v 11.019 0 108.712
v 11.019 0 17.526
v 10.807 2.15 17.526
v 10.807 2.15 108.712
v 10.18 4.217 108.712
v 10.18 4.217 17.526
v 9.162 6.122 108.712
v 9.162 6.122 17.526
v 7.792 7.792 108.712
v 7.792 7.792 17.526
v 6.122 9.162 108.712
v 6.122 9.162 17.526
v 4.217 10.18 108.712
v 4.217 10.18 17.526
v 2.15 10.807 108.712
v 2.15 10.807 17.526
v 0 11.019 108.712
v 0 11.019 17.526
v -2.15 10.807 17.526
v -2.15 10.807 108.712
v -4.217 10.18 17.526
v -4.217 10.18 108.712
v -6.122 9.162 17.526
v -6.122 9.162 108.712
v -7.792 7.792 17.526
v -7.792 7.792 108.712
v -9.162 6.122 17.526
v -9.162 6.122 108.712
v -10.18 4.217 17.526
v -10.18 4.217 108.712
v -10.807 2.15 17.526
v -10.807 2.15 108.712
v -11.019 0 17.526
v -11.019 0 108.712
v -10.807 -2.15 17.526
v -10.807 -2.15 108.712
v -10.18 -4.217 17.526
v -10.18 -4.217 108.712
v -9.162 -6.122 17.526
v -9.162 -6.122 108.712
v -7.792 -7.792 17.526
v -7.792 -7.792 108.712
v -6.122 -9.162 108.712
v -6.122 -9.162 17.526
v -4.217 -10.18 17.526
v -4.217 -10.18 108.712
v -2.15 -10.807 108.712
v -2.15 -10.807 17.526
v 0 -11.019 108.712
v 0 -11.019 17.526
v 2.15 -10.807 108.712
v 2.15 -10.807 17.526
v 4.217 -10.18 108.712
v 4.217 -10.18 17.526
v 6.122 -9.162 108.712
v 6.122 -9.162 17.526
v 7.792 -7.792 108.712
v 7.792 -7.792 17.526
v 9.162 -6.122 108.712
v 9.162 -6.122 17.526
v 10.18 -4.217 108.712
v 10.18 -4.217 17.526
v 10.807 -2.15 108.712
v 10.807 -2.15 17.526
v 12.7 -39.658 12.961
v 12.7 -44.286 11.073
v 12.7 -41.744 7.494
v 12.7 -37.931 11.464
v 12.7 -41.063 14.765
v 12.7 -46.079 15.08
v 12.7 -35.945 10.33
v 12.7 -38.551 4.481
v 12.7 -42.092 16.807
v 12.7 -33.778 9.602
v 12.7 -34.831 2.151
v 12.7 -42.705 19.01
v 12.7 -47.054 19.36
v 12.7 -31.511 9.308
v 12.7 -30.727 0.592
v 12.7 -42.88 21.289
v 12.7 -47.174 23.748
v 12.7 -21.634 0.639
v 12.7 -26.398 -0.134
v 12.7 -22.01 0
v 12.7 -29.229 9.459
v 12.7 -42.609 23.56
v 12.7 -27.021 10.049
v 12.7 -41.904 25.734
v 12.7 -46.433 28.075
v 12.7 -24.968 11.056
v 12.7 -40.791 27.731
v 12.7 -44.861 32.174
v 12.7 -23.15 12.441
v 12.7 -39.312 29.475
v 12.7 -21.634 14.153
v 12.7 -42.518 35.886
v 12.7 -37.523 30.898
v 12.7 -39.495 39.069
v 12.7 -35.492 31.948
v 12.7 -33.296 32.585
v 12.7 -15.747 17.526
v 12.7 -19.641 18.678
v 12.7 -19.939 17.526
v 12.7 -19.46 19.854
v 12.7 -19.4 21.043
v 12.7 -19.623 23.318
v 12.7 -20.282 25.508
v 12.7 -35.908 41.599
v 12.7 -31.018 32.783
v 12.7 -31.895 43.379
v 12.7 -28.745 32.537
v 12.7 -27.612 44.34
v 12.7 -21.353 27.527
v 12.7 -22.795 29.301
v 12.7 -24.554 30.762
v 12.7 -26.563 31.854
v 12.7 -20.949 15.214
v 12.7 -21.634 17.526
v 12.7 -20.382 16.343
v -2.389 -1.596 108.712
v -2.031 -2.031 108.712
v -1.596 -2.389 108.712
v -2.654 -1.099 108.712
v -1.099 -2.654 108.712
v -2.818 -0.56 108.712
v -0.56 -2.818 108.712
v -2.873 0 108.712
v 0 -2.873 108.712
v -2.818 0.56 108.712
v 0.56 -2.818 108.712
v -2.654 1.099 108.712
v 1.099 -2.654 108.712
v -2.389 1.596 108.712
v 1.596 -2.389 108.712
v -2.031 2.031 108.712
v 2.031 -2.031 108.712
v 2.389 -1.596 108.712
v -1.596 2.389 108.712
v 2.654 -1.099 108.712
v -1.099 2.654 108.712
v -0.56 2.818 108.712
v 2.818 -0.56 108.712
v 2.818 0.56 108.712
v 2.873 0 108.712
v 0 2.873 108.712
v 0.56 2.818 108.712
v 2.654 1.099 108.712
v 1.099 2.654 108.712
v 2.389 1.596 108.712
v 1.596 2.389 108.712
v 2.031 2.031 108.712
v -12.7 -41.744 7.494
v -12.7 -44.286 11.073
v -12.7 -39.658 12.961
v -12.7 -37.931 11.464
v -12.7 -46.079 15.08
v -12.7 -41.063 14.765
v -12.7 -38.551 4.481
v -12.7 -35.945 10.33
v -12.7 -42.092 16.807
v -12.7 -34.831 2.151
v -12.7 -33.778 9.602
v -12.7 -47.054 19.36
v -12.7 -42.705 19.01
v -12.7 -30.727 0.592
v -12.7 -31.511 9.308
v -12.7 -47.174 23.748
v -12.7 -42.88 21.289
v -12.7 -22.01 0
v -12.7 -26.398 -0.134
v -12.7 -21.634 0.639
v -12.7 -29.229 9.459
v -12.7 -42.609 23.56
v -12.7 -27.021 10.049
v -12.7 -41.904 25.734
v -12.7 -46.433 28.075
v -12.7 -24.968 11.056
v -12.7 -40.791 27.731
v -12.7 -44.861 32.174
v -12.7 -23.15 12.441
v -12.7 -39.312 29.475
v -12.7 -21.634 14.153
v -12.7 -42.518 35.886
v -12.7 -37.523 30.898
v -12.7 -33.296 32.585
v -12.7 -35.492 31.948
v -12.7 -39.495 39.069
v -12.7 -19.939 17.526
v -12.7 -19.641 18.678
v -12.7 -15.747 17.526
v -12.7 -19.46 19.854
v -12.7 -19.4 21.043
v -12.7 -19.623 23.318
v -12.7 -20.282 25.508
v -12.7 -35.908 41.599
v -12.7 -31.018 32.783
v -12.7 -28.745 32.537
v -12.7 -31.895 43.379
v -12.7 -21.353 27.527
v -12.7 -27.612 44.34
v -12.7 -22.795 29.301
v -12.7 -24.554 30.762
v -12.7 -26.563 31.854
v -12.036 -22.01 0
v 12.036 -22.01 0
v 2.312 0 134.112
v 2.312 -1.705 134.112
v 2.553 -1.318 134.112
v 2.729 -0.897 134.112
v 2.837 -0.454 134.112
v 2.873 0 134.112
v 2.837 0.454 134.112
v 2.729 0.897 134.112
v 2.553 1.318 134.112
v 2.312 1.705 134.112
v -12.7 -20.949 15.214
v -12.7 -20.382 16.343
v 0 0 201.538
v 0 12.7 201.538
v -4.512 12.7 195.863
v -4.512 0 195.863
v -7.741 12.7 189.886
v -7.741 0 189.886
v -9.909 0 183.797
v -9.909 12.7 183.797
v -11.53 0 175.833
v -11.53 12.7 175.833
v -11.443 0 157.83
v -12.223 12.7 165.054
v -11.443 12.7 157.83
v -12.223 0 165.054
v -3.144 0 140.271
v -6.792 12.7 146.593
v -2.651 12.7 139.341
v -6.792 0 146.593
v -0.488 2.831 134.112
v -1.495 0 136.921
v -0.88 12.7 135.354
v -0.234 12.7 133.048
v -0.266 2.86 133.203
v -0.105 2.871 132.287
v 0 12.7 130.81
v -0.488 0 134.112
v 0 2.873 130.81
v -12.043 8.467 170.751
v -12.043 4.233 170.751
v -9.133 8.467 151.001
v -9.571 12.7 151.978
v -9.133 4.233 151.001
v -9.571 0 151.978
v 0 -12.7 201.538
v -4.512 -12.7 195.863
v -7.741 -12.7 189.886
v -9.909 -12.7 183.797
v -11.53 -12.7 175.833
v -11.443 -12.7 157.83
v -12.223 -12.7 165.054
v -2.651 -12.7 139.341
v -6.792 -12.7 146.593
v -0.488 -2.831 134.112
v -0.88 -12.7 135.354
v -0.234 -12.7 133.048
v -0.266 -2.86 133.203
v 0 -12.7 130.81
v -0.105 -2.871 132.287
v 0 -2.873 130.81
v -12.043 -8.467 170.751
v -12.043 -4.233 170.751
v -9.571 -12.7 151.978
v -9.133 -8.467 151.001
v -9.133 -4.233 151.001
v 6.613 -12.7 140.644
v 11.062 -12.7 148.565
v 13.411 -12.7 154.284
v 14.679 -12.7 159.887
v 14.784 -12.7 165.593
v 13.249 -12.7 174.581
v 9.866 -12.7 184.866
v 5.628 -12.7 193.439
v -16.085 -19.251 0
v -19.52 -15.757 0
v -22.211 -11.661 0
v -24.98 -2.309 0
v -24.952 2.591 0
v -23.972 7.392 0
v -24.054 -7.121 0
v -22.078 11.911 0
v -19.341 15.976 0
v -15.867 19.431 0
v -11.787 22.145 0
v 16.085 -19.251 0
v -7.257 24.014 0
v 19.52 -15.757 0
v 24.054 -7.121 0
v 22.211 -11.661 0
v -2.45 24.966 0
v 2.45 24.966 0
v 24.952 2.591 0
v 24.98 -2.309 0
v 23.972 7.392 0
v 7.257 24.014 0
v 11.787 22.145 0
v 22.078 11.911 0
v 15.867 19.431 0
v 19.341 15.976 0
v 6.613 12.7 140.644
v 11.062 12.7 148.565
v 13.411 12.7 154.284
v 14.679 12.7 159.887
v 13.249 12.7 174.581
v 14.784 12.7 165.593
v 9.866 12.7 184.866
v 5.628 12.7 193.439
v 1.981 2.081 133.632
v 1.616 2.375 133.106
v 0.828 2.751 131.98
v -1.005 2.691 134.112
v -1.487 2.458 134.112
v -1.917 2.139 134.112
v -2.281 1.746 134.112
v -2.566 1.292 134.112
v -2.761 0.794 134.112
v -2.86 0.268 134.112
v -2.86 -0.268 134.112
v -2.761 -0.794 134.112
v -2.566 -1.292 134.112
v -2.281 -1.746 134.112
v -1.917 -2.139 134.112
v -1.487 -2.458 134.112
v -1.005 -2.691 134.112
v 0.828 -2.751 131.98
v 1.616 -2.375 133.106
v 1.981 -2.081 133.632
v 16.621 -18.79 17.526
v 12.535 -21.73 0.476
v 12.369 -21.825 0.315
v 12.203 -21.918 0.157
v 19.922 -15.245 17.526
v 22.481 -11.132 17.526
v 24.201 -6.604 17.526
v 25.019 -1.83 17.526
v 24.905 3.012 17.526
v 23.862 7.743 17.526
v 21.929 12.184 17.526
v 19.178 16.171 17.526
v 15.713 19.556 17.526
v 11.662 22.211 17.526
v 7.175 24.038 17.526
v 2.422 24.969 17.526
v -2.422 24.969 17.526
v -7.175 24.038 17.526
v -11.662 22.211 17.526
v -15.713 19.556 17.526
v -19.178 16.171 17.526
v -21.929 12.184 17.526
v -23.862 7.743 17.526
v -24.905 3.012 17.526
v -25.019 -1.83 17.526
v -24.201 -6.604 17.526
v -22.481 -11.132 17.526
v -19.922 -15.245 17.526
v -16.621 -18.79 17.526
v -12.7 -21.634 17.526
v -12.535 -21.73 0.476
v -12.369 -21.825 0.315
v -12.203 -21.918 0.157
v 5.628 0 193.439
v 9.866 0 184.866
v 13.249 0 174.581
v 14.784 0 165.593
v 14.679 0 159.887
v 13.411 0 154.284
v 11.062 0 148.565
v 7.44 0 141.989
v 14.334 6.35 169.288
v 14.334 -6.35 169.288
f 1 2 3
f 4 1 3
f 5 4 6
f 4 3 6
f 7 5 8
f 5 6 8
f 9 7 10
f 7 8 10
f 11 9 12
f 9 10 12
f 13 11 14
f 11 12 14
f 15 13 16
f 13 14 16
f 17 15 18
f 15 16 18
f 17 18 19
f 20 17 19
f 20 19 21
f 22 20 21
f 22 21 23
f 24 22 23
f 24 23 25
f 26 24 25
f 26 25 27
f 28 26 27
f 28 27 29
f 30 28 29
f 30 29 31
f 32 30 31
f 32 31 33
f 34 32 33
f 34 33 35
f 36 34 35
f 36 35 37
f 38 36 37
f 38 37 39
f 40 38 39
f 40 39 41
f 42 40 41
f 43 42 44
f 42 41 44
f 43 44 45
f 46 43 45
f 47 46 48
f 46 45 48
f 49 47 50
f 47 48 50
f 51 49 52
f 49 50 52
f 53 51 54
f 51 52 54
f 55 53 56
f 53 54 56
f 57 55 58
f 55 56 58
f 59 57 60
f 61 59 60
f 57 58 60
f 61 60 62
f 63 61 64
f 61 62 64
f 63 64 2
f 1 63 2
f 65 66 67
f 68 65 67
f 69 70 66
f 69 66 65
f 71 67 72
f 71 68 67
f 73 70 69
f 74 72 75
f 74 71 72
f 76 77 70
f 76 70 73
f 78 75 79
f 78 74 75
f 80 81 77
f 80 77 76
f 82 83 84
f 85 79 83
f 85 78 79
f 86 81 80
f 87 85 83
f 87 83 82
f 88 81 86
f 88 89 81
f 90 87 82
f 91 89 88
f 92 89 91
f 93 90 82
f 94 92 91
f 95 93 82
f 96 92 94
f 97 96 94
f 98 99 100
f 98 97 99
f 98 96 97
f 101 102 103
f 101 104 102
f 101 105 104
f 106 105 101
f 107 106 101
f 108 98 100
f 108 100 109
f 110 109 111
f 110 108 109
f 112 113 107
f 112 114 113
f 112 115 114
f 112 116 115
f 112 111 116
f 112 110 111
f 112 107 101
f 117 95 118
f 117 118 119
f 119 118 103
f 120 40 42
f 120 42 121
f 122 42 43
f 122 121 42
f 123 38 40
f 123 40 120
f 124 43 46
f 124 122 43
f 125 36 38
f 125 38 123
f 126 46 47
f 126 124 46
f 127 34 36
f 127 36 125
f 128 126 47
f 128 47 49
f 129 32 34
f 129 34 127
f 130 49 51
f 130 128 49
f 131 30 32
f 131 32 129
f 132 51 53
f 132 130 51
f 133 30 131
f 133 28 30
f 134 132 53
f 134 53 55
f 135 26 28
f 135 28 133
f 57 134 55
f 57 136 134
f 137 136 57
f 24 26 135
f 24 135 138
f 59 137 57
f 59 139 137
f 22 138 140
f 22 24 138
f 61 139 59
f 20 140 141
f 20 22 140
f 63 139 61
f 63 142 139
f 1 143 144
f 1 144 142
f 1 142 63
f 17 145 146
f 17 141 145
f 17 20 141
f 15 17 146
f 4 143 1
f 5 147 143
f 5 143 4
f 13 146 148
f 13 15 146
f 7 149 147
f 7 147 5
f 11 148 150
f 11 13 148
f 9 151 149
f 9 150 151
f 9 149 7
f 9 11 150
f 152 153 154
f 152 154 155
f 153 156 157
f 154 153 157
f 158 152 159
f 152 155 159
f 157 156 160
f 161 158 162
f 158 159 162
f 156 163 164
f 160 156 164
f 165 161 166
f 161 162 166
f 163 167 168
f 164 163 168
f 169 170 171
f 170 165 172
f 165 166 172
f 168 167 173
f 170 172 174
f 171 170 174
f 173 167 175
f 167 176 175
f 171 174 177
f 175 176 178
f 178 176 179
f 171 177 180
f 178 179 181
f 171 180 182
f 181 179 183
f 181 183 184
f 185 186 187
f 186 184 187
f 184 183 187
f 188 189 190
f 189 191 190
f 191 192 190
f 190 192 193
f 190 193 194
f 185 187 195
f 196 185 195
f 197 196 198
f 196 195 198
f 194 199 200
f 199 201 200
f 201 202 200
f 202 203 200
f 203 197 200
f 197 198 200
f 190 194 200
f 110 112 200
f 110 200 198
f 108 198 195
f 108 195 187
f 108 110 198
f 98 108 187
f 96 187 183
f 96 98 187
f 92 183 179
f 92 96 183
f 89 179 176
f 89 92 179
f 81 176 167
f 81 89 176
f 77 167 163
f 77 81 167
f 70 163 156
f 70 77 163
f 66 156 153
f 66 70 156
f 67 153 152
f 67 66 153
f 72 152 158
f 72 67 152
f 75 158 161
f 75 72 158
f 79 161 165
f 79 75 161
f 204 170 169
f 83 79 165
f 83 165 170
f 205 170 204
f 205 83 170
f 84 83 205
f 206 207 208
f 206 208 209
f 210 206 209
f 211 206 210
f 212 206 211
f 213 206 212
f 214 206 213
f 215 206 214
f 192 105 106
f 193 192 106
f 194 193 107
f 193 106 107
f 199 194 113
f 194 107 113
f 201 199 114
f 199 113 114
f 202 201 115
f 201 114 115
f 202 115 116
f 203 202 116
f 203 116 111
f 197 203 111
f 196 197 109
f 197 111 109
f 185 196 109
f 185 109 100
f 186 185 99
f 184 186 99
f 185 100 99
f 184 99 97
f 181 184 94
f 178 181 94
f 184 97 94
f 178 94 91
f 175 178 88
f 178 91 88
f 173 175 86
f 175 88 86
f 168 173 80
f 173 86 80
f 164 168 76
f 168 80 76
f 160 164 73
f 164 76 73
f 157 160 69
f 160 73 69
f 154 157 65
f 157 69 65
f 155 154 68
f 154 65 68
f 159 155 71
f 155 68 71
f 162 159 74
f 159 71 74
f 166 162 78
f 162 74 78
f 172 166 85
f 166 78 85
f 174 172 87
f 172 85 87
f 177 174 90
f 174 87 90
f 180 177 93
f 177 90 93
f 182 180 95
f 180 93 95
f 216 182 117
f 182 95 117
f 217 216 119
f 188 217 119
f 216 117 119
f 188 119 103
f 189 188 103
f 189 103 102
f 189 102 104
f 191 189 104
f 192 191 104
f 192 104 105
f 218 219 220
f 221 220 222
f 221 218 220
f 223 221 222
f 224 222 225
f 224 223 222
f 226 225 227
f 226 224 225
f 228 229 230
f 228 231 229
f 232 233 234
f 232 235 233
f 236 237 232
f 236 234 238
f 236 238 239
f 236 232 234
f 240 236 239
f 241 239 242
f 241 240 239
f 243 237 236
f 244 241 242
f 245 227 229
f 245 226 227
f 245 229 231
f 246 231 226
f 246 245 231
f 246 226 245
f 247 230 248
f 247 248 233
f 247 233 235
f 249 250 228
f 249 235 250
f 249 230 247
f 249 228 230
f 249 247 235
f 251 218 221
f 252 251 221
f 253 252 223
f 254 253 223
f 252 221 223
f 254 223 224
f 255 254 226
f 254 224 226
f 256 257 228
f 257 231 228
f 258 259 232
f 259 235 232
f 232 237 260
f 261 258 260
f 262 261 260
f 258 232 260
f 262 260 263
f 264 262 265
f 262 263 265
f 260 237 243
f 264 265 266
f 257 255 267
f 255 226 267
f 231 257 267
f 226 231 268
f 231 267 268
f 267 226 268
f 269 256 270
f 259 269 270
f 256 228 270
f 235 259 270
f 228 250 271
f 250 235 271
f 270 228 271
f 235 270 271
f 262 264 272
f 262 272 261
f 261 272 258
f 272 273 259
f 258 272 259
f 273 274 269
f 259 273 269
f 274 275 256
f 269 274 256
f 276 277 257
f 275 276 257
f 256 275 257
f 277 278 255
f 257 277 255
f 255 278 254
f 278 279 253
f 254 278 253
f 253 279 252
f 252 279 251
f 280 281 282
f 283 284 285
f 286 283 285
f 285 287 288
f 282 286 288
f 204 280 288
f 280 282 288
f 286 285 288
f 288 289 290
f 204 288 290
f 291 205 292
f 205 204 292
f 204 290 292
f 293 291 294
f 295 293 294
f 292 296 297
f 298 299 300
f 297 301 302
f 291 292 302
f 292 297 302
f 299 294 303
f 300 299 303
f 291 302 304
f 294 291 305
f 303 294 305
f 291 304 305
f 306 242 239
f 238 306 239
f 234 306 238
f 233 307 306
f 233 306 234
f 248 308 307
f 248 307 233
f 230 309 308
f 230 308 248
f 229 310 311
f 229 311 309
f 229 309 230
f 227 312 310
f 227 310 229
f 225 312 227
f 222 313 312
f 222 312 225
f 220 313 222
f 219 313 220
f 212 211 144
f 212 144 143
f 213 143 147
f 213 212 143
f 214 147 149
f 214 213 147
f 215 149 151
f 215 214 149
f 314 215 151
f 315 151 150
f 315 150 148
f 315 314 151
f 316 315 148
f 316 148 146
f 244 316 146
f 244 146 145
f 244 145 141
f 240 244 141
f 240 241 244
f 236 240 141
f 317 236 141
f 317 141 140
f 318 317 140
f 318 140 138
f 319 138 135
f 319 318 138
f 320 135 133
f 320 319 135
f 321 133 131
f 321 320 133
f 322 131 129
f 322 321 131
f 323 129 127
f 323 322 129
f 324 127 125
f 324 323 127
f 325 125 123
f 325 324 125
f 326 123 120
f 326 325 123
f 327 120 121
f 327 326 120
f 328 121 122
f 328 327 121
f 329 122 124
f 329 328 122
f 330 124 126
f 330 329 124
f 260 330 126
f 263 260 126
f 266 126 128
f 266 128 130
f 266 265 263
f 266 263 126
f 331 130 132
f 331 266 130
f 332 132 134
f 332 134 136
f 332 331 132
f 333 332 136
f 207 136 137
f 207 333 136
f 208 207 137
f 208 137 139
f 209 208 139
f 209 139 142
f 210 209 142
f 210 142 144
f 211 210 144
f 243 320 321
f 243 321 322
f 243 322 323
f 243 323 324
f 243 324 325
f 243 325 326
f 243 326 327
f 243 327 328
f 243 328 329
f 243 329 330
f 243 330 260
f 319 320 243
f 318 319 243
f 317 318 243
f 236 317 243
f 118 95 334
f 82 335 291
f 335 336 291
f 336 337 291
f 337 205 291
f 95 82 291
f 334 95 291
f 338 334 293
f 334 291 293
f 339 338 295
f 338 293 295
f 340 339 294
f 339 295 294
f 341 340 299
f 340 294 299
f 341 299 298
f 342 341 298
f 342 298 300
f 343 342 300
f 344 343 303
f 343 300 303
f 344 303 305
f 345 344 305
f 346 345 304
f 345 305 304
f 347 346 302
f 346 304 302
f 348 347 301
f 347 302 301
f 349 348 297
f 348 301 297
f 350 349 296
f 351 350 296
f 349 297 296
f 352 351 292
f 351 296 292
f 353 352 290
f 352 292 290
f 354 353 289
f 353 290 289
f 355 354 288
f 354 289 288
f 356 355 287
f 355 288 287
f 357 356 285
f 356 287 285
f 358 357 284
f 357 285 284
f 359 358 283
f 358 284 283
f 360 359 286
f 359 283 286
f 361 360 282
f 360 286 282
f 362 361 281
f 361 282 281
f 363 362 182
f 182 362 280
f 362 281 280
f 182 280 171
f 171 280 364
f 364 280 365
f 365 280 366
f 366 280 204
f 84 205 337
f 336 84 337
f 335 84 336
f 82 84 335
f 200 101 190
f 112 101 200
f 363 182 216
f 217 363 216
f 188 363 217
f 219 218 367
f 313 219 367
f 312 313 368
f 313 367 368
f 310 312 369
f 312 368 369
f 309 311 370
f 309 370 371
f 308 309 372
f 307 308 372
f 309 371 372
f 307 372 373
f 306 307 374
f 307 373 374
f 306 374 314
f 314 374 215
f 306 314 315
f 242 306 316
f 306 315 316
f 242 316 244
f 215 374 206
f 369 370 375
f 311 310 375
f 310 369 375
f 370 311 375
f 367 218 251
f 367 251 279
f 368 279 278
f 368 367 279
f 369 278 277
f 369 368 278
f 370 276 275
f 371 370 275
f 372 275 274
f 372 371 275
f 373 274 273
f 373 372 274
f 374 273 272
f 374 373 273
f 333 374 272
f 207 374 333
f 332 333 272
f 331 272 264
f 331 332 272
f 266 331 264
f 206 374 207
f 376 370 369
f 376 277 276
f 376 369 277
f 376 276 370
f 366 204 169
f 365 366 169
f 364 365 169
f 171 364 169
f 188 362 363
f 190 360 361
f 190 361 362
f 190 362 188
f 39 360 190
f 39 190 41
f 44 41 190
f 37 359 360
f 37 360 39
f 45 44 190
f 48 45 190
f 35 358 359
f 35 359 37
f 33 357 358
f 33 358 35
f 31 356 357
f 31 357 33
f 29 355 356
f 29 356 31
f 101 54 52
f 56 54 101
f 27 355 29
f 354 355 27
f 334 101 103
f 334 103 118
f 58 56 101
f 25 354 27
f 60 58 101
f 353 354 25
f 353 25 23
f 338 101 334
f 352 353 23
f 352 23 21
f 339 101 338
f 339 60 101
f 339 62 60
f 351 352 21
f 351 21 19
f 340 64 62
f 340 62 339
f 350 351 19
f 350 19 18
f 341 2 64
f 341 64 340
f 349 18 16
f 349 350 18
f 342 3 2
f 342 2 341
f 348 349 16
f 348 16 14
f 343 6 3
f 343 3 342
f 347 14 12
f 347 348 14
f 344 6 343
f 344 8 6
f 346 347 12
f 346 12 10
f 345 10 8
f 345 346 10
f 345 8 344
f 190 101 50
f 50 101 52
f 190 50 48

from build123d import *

# Parameters (mm, degrees)
F0_R      = 25.0862676095
F0_R_2    = 9.9212052261
F1_DEPTH  = 17.526
F2_R      = 11.0191356669
F3_DEPTH  = 108.712
F5_R      = 2.8727507543
F6_DEPTH  = 25.4
F8_DEPTH  = 12.7
F9_R      = 11.7410453839
F10_DEPTH = 12.7
F12_DEPTH = 12.7


with BuildPart() as f1:
    # F0 (on Top) → F1 (new body)
    with BuildSketch(Plane.XY):
        Circle(F0_R)
        Circle(F0_R_2, mode=Mode.SUBTRACT)
    extrude(amount=F1_DEPTH)

    # F2 (on Top) → F3 (join)
    with BuildSketch(Plane.XY):
        Circle(F2_R)
    extrude(amount=F3_DEPTH)

    # F5 (on offset) → F6 (join)
    with BuildSketch(Plane.XY.offset(134.112)):
        Circle(F5_R)
    extrude(amount=-F6_DEPTH)

    # F7 (on Right) → F8 (join, symmetric)
    with BuildSketch(Plane.YZ):
        with BuildLine():
            Line((-14.0056908131, 13.5905332863), (-27.6115936243, 44.3398724095))
            ThreePointArc((-27.6115936243, 44.3398724095), (-47.0539529538, 19.3601672357), (-22.0104921012, 0))
            Line((-22.0104921012, 0), (-14.0056908131, 13.5905332863))
        make_face()
    extrude(amount=F8_DEPTH, both=True)

    # F9 (on Right) → F10 (cut, symmetric)
    with BuildSketch(Plane.YZ):
        with Locations((-31.1411302537, 21.0428796709)):
            Circle(F9_R)
    extrude(amount=F10_DEPTH, both=True, mode=Mode.SUBTRACT)

    # F11 (on Front) → F12 (join, symmetric)
    with BuildSketch(Plane.XZ):
        with BuildLine():
            add(Edge.make_bspline(
                [(0, 201.5375494957), (8.2067918749, 191.5956386678), (17.6385011209, 165.7506647475), (14.33397457, 150.9642153978), (0, 130.8100919055)],
                knots=[0, 0, 0, 0, 0.4810826992, 1, 1, 1, 1], degree=3))
            add(Edge.make_bspline(
                [(0, 201.5375494957), (-9.1203246266, 192.0092403889), (-13.1277565836, 171.0788275856), (-11.6600287617, 151.1036541195), (0, 137.038230896), (0, 130.8100919055)],
                knots=[0, 0, 0, 0, 0.3852312794, 0.6845969407, 1, 1, 1, 1], degree=3))
        make_face()
    extrude(amount=F12_DEPTH, both=True)


solid = f1.part
